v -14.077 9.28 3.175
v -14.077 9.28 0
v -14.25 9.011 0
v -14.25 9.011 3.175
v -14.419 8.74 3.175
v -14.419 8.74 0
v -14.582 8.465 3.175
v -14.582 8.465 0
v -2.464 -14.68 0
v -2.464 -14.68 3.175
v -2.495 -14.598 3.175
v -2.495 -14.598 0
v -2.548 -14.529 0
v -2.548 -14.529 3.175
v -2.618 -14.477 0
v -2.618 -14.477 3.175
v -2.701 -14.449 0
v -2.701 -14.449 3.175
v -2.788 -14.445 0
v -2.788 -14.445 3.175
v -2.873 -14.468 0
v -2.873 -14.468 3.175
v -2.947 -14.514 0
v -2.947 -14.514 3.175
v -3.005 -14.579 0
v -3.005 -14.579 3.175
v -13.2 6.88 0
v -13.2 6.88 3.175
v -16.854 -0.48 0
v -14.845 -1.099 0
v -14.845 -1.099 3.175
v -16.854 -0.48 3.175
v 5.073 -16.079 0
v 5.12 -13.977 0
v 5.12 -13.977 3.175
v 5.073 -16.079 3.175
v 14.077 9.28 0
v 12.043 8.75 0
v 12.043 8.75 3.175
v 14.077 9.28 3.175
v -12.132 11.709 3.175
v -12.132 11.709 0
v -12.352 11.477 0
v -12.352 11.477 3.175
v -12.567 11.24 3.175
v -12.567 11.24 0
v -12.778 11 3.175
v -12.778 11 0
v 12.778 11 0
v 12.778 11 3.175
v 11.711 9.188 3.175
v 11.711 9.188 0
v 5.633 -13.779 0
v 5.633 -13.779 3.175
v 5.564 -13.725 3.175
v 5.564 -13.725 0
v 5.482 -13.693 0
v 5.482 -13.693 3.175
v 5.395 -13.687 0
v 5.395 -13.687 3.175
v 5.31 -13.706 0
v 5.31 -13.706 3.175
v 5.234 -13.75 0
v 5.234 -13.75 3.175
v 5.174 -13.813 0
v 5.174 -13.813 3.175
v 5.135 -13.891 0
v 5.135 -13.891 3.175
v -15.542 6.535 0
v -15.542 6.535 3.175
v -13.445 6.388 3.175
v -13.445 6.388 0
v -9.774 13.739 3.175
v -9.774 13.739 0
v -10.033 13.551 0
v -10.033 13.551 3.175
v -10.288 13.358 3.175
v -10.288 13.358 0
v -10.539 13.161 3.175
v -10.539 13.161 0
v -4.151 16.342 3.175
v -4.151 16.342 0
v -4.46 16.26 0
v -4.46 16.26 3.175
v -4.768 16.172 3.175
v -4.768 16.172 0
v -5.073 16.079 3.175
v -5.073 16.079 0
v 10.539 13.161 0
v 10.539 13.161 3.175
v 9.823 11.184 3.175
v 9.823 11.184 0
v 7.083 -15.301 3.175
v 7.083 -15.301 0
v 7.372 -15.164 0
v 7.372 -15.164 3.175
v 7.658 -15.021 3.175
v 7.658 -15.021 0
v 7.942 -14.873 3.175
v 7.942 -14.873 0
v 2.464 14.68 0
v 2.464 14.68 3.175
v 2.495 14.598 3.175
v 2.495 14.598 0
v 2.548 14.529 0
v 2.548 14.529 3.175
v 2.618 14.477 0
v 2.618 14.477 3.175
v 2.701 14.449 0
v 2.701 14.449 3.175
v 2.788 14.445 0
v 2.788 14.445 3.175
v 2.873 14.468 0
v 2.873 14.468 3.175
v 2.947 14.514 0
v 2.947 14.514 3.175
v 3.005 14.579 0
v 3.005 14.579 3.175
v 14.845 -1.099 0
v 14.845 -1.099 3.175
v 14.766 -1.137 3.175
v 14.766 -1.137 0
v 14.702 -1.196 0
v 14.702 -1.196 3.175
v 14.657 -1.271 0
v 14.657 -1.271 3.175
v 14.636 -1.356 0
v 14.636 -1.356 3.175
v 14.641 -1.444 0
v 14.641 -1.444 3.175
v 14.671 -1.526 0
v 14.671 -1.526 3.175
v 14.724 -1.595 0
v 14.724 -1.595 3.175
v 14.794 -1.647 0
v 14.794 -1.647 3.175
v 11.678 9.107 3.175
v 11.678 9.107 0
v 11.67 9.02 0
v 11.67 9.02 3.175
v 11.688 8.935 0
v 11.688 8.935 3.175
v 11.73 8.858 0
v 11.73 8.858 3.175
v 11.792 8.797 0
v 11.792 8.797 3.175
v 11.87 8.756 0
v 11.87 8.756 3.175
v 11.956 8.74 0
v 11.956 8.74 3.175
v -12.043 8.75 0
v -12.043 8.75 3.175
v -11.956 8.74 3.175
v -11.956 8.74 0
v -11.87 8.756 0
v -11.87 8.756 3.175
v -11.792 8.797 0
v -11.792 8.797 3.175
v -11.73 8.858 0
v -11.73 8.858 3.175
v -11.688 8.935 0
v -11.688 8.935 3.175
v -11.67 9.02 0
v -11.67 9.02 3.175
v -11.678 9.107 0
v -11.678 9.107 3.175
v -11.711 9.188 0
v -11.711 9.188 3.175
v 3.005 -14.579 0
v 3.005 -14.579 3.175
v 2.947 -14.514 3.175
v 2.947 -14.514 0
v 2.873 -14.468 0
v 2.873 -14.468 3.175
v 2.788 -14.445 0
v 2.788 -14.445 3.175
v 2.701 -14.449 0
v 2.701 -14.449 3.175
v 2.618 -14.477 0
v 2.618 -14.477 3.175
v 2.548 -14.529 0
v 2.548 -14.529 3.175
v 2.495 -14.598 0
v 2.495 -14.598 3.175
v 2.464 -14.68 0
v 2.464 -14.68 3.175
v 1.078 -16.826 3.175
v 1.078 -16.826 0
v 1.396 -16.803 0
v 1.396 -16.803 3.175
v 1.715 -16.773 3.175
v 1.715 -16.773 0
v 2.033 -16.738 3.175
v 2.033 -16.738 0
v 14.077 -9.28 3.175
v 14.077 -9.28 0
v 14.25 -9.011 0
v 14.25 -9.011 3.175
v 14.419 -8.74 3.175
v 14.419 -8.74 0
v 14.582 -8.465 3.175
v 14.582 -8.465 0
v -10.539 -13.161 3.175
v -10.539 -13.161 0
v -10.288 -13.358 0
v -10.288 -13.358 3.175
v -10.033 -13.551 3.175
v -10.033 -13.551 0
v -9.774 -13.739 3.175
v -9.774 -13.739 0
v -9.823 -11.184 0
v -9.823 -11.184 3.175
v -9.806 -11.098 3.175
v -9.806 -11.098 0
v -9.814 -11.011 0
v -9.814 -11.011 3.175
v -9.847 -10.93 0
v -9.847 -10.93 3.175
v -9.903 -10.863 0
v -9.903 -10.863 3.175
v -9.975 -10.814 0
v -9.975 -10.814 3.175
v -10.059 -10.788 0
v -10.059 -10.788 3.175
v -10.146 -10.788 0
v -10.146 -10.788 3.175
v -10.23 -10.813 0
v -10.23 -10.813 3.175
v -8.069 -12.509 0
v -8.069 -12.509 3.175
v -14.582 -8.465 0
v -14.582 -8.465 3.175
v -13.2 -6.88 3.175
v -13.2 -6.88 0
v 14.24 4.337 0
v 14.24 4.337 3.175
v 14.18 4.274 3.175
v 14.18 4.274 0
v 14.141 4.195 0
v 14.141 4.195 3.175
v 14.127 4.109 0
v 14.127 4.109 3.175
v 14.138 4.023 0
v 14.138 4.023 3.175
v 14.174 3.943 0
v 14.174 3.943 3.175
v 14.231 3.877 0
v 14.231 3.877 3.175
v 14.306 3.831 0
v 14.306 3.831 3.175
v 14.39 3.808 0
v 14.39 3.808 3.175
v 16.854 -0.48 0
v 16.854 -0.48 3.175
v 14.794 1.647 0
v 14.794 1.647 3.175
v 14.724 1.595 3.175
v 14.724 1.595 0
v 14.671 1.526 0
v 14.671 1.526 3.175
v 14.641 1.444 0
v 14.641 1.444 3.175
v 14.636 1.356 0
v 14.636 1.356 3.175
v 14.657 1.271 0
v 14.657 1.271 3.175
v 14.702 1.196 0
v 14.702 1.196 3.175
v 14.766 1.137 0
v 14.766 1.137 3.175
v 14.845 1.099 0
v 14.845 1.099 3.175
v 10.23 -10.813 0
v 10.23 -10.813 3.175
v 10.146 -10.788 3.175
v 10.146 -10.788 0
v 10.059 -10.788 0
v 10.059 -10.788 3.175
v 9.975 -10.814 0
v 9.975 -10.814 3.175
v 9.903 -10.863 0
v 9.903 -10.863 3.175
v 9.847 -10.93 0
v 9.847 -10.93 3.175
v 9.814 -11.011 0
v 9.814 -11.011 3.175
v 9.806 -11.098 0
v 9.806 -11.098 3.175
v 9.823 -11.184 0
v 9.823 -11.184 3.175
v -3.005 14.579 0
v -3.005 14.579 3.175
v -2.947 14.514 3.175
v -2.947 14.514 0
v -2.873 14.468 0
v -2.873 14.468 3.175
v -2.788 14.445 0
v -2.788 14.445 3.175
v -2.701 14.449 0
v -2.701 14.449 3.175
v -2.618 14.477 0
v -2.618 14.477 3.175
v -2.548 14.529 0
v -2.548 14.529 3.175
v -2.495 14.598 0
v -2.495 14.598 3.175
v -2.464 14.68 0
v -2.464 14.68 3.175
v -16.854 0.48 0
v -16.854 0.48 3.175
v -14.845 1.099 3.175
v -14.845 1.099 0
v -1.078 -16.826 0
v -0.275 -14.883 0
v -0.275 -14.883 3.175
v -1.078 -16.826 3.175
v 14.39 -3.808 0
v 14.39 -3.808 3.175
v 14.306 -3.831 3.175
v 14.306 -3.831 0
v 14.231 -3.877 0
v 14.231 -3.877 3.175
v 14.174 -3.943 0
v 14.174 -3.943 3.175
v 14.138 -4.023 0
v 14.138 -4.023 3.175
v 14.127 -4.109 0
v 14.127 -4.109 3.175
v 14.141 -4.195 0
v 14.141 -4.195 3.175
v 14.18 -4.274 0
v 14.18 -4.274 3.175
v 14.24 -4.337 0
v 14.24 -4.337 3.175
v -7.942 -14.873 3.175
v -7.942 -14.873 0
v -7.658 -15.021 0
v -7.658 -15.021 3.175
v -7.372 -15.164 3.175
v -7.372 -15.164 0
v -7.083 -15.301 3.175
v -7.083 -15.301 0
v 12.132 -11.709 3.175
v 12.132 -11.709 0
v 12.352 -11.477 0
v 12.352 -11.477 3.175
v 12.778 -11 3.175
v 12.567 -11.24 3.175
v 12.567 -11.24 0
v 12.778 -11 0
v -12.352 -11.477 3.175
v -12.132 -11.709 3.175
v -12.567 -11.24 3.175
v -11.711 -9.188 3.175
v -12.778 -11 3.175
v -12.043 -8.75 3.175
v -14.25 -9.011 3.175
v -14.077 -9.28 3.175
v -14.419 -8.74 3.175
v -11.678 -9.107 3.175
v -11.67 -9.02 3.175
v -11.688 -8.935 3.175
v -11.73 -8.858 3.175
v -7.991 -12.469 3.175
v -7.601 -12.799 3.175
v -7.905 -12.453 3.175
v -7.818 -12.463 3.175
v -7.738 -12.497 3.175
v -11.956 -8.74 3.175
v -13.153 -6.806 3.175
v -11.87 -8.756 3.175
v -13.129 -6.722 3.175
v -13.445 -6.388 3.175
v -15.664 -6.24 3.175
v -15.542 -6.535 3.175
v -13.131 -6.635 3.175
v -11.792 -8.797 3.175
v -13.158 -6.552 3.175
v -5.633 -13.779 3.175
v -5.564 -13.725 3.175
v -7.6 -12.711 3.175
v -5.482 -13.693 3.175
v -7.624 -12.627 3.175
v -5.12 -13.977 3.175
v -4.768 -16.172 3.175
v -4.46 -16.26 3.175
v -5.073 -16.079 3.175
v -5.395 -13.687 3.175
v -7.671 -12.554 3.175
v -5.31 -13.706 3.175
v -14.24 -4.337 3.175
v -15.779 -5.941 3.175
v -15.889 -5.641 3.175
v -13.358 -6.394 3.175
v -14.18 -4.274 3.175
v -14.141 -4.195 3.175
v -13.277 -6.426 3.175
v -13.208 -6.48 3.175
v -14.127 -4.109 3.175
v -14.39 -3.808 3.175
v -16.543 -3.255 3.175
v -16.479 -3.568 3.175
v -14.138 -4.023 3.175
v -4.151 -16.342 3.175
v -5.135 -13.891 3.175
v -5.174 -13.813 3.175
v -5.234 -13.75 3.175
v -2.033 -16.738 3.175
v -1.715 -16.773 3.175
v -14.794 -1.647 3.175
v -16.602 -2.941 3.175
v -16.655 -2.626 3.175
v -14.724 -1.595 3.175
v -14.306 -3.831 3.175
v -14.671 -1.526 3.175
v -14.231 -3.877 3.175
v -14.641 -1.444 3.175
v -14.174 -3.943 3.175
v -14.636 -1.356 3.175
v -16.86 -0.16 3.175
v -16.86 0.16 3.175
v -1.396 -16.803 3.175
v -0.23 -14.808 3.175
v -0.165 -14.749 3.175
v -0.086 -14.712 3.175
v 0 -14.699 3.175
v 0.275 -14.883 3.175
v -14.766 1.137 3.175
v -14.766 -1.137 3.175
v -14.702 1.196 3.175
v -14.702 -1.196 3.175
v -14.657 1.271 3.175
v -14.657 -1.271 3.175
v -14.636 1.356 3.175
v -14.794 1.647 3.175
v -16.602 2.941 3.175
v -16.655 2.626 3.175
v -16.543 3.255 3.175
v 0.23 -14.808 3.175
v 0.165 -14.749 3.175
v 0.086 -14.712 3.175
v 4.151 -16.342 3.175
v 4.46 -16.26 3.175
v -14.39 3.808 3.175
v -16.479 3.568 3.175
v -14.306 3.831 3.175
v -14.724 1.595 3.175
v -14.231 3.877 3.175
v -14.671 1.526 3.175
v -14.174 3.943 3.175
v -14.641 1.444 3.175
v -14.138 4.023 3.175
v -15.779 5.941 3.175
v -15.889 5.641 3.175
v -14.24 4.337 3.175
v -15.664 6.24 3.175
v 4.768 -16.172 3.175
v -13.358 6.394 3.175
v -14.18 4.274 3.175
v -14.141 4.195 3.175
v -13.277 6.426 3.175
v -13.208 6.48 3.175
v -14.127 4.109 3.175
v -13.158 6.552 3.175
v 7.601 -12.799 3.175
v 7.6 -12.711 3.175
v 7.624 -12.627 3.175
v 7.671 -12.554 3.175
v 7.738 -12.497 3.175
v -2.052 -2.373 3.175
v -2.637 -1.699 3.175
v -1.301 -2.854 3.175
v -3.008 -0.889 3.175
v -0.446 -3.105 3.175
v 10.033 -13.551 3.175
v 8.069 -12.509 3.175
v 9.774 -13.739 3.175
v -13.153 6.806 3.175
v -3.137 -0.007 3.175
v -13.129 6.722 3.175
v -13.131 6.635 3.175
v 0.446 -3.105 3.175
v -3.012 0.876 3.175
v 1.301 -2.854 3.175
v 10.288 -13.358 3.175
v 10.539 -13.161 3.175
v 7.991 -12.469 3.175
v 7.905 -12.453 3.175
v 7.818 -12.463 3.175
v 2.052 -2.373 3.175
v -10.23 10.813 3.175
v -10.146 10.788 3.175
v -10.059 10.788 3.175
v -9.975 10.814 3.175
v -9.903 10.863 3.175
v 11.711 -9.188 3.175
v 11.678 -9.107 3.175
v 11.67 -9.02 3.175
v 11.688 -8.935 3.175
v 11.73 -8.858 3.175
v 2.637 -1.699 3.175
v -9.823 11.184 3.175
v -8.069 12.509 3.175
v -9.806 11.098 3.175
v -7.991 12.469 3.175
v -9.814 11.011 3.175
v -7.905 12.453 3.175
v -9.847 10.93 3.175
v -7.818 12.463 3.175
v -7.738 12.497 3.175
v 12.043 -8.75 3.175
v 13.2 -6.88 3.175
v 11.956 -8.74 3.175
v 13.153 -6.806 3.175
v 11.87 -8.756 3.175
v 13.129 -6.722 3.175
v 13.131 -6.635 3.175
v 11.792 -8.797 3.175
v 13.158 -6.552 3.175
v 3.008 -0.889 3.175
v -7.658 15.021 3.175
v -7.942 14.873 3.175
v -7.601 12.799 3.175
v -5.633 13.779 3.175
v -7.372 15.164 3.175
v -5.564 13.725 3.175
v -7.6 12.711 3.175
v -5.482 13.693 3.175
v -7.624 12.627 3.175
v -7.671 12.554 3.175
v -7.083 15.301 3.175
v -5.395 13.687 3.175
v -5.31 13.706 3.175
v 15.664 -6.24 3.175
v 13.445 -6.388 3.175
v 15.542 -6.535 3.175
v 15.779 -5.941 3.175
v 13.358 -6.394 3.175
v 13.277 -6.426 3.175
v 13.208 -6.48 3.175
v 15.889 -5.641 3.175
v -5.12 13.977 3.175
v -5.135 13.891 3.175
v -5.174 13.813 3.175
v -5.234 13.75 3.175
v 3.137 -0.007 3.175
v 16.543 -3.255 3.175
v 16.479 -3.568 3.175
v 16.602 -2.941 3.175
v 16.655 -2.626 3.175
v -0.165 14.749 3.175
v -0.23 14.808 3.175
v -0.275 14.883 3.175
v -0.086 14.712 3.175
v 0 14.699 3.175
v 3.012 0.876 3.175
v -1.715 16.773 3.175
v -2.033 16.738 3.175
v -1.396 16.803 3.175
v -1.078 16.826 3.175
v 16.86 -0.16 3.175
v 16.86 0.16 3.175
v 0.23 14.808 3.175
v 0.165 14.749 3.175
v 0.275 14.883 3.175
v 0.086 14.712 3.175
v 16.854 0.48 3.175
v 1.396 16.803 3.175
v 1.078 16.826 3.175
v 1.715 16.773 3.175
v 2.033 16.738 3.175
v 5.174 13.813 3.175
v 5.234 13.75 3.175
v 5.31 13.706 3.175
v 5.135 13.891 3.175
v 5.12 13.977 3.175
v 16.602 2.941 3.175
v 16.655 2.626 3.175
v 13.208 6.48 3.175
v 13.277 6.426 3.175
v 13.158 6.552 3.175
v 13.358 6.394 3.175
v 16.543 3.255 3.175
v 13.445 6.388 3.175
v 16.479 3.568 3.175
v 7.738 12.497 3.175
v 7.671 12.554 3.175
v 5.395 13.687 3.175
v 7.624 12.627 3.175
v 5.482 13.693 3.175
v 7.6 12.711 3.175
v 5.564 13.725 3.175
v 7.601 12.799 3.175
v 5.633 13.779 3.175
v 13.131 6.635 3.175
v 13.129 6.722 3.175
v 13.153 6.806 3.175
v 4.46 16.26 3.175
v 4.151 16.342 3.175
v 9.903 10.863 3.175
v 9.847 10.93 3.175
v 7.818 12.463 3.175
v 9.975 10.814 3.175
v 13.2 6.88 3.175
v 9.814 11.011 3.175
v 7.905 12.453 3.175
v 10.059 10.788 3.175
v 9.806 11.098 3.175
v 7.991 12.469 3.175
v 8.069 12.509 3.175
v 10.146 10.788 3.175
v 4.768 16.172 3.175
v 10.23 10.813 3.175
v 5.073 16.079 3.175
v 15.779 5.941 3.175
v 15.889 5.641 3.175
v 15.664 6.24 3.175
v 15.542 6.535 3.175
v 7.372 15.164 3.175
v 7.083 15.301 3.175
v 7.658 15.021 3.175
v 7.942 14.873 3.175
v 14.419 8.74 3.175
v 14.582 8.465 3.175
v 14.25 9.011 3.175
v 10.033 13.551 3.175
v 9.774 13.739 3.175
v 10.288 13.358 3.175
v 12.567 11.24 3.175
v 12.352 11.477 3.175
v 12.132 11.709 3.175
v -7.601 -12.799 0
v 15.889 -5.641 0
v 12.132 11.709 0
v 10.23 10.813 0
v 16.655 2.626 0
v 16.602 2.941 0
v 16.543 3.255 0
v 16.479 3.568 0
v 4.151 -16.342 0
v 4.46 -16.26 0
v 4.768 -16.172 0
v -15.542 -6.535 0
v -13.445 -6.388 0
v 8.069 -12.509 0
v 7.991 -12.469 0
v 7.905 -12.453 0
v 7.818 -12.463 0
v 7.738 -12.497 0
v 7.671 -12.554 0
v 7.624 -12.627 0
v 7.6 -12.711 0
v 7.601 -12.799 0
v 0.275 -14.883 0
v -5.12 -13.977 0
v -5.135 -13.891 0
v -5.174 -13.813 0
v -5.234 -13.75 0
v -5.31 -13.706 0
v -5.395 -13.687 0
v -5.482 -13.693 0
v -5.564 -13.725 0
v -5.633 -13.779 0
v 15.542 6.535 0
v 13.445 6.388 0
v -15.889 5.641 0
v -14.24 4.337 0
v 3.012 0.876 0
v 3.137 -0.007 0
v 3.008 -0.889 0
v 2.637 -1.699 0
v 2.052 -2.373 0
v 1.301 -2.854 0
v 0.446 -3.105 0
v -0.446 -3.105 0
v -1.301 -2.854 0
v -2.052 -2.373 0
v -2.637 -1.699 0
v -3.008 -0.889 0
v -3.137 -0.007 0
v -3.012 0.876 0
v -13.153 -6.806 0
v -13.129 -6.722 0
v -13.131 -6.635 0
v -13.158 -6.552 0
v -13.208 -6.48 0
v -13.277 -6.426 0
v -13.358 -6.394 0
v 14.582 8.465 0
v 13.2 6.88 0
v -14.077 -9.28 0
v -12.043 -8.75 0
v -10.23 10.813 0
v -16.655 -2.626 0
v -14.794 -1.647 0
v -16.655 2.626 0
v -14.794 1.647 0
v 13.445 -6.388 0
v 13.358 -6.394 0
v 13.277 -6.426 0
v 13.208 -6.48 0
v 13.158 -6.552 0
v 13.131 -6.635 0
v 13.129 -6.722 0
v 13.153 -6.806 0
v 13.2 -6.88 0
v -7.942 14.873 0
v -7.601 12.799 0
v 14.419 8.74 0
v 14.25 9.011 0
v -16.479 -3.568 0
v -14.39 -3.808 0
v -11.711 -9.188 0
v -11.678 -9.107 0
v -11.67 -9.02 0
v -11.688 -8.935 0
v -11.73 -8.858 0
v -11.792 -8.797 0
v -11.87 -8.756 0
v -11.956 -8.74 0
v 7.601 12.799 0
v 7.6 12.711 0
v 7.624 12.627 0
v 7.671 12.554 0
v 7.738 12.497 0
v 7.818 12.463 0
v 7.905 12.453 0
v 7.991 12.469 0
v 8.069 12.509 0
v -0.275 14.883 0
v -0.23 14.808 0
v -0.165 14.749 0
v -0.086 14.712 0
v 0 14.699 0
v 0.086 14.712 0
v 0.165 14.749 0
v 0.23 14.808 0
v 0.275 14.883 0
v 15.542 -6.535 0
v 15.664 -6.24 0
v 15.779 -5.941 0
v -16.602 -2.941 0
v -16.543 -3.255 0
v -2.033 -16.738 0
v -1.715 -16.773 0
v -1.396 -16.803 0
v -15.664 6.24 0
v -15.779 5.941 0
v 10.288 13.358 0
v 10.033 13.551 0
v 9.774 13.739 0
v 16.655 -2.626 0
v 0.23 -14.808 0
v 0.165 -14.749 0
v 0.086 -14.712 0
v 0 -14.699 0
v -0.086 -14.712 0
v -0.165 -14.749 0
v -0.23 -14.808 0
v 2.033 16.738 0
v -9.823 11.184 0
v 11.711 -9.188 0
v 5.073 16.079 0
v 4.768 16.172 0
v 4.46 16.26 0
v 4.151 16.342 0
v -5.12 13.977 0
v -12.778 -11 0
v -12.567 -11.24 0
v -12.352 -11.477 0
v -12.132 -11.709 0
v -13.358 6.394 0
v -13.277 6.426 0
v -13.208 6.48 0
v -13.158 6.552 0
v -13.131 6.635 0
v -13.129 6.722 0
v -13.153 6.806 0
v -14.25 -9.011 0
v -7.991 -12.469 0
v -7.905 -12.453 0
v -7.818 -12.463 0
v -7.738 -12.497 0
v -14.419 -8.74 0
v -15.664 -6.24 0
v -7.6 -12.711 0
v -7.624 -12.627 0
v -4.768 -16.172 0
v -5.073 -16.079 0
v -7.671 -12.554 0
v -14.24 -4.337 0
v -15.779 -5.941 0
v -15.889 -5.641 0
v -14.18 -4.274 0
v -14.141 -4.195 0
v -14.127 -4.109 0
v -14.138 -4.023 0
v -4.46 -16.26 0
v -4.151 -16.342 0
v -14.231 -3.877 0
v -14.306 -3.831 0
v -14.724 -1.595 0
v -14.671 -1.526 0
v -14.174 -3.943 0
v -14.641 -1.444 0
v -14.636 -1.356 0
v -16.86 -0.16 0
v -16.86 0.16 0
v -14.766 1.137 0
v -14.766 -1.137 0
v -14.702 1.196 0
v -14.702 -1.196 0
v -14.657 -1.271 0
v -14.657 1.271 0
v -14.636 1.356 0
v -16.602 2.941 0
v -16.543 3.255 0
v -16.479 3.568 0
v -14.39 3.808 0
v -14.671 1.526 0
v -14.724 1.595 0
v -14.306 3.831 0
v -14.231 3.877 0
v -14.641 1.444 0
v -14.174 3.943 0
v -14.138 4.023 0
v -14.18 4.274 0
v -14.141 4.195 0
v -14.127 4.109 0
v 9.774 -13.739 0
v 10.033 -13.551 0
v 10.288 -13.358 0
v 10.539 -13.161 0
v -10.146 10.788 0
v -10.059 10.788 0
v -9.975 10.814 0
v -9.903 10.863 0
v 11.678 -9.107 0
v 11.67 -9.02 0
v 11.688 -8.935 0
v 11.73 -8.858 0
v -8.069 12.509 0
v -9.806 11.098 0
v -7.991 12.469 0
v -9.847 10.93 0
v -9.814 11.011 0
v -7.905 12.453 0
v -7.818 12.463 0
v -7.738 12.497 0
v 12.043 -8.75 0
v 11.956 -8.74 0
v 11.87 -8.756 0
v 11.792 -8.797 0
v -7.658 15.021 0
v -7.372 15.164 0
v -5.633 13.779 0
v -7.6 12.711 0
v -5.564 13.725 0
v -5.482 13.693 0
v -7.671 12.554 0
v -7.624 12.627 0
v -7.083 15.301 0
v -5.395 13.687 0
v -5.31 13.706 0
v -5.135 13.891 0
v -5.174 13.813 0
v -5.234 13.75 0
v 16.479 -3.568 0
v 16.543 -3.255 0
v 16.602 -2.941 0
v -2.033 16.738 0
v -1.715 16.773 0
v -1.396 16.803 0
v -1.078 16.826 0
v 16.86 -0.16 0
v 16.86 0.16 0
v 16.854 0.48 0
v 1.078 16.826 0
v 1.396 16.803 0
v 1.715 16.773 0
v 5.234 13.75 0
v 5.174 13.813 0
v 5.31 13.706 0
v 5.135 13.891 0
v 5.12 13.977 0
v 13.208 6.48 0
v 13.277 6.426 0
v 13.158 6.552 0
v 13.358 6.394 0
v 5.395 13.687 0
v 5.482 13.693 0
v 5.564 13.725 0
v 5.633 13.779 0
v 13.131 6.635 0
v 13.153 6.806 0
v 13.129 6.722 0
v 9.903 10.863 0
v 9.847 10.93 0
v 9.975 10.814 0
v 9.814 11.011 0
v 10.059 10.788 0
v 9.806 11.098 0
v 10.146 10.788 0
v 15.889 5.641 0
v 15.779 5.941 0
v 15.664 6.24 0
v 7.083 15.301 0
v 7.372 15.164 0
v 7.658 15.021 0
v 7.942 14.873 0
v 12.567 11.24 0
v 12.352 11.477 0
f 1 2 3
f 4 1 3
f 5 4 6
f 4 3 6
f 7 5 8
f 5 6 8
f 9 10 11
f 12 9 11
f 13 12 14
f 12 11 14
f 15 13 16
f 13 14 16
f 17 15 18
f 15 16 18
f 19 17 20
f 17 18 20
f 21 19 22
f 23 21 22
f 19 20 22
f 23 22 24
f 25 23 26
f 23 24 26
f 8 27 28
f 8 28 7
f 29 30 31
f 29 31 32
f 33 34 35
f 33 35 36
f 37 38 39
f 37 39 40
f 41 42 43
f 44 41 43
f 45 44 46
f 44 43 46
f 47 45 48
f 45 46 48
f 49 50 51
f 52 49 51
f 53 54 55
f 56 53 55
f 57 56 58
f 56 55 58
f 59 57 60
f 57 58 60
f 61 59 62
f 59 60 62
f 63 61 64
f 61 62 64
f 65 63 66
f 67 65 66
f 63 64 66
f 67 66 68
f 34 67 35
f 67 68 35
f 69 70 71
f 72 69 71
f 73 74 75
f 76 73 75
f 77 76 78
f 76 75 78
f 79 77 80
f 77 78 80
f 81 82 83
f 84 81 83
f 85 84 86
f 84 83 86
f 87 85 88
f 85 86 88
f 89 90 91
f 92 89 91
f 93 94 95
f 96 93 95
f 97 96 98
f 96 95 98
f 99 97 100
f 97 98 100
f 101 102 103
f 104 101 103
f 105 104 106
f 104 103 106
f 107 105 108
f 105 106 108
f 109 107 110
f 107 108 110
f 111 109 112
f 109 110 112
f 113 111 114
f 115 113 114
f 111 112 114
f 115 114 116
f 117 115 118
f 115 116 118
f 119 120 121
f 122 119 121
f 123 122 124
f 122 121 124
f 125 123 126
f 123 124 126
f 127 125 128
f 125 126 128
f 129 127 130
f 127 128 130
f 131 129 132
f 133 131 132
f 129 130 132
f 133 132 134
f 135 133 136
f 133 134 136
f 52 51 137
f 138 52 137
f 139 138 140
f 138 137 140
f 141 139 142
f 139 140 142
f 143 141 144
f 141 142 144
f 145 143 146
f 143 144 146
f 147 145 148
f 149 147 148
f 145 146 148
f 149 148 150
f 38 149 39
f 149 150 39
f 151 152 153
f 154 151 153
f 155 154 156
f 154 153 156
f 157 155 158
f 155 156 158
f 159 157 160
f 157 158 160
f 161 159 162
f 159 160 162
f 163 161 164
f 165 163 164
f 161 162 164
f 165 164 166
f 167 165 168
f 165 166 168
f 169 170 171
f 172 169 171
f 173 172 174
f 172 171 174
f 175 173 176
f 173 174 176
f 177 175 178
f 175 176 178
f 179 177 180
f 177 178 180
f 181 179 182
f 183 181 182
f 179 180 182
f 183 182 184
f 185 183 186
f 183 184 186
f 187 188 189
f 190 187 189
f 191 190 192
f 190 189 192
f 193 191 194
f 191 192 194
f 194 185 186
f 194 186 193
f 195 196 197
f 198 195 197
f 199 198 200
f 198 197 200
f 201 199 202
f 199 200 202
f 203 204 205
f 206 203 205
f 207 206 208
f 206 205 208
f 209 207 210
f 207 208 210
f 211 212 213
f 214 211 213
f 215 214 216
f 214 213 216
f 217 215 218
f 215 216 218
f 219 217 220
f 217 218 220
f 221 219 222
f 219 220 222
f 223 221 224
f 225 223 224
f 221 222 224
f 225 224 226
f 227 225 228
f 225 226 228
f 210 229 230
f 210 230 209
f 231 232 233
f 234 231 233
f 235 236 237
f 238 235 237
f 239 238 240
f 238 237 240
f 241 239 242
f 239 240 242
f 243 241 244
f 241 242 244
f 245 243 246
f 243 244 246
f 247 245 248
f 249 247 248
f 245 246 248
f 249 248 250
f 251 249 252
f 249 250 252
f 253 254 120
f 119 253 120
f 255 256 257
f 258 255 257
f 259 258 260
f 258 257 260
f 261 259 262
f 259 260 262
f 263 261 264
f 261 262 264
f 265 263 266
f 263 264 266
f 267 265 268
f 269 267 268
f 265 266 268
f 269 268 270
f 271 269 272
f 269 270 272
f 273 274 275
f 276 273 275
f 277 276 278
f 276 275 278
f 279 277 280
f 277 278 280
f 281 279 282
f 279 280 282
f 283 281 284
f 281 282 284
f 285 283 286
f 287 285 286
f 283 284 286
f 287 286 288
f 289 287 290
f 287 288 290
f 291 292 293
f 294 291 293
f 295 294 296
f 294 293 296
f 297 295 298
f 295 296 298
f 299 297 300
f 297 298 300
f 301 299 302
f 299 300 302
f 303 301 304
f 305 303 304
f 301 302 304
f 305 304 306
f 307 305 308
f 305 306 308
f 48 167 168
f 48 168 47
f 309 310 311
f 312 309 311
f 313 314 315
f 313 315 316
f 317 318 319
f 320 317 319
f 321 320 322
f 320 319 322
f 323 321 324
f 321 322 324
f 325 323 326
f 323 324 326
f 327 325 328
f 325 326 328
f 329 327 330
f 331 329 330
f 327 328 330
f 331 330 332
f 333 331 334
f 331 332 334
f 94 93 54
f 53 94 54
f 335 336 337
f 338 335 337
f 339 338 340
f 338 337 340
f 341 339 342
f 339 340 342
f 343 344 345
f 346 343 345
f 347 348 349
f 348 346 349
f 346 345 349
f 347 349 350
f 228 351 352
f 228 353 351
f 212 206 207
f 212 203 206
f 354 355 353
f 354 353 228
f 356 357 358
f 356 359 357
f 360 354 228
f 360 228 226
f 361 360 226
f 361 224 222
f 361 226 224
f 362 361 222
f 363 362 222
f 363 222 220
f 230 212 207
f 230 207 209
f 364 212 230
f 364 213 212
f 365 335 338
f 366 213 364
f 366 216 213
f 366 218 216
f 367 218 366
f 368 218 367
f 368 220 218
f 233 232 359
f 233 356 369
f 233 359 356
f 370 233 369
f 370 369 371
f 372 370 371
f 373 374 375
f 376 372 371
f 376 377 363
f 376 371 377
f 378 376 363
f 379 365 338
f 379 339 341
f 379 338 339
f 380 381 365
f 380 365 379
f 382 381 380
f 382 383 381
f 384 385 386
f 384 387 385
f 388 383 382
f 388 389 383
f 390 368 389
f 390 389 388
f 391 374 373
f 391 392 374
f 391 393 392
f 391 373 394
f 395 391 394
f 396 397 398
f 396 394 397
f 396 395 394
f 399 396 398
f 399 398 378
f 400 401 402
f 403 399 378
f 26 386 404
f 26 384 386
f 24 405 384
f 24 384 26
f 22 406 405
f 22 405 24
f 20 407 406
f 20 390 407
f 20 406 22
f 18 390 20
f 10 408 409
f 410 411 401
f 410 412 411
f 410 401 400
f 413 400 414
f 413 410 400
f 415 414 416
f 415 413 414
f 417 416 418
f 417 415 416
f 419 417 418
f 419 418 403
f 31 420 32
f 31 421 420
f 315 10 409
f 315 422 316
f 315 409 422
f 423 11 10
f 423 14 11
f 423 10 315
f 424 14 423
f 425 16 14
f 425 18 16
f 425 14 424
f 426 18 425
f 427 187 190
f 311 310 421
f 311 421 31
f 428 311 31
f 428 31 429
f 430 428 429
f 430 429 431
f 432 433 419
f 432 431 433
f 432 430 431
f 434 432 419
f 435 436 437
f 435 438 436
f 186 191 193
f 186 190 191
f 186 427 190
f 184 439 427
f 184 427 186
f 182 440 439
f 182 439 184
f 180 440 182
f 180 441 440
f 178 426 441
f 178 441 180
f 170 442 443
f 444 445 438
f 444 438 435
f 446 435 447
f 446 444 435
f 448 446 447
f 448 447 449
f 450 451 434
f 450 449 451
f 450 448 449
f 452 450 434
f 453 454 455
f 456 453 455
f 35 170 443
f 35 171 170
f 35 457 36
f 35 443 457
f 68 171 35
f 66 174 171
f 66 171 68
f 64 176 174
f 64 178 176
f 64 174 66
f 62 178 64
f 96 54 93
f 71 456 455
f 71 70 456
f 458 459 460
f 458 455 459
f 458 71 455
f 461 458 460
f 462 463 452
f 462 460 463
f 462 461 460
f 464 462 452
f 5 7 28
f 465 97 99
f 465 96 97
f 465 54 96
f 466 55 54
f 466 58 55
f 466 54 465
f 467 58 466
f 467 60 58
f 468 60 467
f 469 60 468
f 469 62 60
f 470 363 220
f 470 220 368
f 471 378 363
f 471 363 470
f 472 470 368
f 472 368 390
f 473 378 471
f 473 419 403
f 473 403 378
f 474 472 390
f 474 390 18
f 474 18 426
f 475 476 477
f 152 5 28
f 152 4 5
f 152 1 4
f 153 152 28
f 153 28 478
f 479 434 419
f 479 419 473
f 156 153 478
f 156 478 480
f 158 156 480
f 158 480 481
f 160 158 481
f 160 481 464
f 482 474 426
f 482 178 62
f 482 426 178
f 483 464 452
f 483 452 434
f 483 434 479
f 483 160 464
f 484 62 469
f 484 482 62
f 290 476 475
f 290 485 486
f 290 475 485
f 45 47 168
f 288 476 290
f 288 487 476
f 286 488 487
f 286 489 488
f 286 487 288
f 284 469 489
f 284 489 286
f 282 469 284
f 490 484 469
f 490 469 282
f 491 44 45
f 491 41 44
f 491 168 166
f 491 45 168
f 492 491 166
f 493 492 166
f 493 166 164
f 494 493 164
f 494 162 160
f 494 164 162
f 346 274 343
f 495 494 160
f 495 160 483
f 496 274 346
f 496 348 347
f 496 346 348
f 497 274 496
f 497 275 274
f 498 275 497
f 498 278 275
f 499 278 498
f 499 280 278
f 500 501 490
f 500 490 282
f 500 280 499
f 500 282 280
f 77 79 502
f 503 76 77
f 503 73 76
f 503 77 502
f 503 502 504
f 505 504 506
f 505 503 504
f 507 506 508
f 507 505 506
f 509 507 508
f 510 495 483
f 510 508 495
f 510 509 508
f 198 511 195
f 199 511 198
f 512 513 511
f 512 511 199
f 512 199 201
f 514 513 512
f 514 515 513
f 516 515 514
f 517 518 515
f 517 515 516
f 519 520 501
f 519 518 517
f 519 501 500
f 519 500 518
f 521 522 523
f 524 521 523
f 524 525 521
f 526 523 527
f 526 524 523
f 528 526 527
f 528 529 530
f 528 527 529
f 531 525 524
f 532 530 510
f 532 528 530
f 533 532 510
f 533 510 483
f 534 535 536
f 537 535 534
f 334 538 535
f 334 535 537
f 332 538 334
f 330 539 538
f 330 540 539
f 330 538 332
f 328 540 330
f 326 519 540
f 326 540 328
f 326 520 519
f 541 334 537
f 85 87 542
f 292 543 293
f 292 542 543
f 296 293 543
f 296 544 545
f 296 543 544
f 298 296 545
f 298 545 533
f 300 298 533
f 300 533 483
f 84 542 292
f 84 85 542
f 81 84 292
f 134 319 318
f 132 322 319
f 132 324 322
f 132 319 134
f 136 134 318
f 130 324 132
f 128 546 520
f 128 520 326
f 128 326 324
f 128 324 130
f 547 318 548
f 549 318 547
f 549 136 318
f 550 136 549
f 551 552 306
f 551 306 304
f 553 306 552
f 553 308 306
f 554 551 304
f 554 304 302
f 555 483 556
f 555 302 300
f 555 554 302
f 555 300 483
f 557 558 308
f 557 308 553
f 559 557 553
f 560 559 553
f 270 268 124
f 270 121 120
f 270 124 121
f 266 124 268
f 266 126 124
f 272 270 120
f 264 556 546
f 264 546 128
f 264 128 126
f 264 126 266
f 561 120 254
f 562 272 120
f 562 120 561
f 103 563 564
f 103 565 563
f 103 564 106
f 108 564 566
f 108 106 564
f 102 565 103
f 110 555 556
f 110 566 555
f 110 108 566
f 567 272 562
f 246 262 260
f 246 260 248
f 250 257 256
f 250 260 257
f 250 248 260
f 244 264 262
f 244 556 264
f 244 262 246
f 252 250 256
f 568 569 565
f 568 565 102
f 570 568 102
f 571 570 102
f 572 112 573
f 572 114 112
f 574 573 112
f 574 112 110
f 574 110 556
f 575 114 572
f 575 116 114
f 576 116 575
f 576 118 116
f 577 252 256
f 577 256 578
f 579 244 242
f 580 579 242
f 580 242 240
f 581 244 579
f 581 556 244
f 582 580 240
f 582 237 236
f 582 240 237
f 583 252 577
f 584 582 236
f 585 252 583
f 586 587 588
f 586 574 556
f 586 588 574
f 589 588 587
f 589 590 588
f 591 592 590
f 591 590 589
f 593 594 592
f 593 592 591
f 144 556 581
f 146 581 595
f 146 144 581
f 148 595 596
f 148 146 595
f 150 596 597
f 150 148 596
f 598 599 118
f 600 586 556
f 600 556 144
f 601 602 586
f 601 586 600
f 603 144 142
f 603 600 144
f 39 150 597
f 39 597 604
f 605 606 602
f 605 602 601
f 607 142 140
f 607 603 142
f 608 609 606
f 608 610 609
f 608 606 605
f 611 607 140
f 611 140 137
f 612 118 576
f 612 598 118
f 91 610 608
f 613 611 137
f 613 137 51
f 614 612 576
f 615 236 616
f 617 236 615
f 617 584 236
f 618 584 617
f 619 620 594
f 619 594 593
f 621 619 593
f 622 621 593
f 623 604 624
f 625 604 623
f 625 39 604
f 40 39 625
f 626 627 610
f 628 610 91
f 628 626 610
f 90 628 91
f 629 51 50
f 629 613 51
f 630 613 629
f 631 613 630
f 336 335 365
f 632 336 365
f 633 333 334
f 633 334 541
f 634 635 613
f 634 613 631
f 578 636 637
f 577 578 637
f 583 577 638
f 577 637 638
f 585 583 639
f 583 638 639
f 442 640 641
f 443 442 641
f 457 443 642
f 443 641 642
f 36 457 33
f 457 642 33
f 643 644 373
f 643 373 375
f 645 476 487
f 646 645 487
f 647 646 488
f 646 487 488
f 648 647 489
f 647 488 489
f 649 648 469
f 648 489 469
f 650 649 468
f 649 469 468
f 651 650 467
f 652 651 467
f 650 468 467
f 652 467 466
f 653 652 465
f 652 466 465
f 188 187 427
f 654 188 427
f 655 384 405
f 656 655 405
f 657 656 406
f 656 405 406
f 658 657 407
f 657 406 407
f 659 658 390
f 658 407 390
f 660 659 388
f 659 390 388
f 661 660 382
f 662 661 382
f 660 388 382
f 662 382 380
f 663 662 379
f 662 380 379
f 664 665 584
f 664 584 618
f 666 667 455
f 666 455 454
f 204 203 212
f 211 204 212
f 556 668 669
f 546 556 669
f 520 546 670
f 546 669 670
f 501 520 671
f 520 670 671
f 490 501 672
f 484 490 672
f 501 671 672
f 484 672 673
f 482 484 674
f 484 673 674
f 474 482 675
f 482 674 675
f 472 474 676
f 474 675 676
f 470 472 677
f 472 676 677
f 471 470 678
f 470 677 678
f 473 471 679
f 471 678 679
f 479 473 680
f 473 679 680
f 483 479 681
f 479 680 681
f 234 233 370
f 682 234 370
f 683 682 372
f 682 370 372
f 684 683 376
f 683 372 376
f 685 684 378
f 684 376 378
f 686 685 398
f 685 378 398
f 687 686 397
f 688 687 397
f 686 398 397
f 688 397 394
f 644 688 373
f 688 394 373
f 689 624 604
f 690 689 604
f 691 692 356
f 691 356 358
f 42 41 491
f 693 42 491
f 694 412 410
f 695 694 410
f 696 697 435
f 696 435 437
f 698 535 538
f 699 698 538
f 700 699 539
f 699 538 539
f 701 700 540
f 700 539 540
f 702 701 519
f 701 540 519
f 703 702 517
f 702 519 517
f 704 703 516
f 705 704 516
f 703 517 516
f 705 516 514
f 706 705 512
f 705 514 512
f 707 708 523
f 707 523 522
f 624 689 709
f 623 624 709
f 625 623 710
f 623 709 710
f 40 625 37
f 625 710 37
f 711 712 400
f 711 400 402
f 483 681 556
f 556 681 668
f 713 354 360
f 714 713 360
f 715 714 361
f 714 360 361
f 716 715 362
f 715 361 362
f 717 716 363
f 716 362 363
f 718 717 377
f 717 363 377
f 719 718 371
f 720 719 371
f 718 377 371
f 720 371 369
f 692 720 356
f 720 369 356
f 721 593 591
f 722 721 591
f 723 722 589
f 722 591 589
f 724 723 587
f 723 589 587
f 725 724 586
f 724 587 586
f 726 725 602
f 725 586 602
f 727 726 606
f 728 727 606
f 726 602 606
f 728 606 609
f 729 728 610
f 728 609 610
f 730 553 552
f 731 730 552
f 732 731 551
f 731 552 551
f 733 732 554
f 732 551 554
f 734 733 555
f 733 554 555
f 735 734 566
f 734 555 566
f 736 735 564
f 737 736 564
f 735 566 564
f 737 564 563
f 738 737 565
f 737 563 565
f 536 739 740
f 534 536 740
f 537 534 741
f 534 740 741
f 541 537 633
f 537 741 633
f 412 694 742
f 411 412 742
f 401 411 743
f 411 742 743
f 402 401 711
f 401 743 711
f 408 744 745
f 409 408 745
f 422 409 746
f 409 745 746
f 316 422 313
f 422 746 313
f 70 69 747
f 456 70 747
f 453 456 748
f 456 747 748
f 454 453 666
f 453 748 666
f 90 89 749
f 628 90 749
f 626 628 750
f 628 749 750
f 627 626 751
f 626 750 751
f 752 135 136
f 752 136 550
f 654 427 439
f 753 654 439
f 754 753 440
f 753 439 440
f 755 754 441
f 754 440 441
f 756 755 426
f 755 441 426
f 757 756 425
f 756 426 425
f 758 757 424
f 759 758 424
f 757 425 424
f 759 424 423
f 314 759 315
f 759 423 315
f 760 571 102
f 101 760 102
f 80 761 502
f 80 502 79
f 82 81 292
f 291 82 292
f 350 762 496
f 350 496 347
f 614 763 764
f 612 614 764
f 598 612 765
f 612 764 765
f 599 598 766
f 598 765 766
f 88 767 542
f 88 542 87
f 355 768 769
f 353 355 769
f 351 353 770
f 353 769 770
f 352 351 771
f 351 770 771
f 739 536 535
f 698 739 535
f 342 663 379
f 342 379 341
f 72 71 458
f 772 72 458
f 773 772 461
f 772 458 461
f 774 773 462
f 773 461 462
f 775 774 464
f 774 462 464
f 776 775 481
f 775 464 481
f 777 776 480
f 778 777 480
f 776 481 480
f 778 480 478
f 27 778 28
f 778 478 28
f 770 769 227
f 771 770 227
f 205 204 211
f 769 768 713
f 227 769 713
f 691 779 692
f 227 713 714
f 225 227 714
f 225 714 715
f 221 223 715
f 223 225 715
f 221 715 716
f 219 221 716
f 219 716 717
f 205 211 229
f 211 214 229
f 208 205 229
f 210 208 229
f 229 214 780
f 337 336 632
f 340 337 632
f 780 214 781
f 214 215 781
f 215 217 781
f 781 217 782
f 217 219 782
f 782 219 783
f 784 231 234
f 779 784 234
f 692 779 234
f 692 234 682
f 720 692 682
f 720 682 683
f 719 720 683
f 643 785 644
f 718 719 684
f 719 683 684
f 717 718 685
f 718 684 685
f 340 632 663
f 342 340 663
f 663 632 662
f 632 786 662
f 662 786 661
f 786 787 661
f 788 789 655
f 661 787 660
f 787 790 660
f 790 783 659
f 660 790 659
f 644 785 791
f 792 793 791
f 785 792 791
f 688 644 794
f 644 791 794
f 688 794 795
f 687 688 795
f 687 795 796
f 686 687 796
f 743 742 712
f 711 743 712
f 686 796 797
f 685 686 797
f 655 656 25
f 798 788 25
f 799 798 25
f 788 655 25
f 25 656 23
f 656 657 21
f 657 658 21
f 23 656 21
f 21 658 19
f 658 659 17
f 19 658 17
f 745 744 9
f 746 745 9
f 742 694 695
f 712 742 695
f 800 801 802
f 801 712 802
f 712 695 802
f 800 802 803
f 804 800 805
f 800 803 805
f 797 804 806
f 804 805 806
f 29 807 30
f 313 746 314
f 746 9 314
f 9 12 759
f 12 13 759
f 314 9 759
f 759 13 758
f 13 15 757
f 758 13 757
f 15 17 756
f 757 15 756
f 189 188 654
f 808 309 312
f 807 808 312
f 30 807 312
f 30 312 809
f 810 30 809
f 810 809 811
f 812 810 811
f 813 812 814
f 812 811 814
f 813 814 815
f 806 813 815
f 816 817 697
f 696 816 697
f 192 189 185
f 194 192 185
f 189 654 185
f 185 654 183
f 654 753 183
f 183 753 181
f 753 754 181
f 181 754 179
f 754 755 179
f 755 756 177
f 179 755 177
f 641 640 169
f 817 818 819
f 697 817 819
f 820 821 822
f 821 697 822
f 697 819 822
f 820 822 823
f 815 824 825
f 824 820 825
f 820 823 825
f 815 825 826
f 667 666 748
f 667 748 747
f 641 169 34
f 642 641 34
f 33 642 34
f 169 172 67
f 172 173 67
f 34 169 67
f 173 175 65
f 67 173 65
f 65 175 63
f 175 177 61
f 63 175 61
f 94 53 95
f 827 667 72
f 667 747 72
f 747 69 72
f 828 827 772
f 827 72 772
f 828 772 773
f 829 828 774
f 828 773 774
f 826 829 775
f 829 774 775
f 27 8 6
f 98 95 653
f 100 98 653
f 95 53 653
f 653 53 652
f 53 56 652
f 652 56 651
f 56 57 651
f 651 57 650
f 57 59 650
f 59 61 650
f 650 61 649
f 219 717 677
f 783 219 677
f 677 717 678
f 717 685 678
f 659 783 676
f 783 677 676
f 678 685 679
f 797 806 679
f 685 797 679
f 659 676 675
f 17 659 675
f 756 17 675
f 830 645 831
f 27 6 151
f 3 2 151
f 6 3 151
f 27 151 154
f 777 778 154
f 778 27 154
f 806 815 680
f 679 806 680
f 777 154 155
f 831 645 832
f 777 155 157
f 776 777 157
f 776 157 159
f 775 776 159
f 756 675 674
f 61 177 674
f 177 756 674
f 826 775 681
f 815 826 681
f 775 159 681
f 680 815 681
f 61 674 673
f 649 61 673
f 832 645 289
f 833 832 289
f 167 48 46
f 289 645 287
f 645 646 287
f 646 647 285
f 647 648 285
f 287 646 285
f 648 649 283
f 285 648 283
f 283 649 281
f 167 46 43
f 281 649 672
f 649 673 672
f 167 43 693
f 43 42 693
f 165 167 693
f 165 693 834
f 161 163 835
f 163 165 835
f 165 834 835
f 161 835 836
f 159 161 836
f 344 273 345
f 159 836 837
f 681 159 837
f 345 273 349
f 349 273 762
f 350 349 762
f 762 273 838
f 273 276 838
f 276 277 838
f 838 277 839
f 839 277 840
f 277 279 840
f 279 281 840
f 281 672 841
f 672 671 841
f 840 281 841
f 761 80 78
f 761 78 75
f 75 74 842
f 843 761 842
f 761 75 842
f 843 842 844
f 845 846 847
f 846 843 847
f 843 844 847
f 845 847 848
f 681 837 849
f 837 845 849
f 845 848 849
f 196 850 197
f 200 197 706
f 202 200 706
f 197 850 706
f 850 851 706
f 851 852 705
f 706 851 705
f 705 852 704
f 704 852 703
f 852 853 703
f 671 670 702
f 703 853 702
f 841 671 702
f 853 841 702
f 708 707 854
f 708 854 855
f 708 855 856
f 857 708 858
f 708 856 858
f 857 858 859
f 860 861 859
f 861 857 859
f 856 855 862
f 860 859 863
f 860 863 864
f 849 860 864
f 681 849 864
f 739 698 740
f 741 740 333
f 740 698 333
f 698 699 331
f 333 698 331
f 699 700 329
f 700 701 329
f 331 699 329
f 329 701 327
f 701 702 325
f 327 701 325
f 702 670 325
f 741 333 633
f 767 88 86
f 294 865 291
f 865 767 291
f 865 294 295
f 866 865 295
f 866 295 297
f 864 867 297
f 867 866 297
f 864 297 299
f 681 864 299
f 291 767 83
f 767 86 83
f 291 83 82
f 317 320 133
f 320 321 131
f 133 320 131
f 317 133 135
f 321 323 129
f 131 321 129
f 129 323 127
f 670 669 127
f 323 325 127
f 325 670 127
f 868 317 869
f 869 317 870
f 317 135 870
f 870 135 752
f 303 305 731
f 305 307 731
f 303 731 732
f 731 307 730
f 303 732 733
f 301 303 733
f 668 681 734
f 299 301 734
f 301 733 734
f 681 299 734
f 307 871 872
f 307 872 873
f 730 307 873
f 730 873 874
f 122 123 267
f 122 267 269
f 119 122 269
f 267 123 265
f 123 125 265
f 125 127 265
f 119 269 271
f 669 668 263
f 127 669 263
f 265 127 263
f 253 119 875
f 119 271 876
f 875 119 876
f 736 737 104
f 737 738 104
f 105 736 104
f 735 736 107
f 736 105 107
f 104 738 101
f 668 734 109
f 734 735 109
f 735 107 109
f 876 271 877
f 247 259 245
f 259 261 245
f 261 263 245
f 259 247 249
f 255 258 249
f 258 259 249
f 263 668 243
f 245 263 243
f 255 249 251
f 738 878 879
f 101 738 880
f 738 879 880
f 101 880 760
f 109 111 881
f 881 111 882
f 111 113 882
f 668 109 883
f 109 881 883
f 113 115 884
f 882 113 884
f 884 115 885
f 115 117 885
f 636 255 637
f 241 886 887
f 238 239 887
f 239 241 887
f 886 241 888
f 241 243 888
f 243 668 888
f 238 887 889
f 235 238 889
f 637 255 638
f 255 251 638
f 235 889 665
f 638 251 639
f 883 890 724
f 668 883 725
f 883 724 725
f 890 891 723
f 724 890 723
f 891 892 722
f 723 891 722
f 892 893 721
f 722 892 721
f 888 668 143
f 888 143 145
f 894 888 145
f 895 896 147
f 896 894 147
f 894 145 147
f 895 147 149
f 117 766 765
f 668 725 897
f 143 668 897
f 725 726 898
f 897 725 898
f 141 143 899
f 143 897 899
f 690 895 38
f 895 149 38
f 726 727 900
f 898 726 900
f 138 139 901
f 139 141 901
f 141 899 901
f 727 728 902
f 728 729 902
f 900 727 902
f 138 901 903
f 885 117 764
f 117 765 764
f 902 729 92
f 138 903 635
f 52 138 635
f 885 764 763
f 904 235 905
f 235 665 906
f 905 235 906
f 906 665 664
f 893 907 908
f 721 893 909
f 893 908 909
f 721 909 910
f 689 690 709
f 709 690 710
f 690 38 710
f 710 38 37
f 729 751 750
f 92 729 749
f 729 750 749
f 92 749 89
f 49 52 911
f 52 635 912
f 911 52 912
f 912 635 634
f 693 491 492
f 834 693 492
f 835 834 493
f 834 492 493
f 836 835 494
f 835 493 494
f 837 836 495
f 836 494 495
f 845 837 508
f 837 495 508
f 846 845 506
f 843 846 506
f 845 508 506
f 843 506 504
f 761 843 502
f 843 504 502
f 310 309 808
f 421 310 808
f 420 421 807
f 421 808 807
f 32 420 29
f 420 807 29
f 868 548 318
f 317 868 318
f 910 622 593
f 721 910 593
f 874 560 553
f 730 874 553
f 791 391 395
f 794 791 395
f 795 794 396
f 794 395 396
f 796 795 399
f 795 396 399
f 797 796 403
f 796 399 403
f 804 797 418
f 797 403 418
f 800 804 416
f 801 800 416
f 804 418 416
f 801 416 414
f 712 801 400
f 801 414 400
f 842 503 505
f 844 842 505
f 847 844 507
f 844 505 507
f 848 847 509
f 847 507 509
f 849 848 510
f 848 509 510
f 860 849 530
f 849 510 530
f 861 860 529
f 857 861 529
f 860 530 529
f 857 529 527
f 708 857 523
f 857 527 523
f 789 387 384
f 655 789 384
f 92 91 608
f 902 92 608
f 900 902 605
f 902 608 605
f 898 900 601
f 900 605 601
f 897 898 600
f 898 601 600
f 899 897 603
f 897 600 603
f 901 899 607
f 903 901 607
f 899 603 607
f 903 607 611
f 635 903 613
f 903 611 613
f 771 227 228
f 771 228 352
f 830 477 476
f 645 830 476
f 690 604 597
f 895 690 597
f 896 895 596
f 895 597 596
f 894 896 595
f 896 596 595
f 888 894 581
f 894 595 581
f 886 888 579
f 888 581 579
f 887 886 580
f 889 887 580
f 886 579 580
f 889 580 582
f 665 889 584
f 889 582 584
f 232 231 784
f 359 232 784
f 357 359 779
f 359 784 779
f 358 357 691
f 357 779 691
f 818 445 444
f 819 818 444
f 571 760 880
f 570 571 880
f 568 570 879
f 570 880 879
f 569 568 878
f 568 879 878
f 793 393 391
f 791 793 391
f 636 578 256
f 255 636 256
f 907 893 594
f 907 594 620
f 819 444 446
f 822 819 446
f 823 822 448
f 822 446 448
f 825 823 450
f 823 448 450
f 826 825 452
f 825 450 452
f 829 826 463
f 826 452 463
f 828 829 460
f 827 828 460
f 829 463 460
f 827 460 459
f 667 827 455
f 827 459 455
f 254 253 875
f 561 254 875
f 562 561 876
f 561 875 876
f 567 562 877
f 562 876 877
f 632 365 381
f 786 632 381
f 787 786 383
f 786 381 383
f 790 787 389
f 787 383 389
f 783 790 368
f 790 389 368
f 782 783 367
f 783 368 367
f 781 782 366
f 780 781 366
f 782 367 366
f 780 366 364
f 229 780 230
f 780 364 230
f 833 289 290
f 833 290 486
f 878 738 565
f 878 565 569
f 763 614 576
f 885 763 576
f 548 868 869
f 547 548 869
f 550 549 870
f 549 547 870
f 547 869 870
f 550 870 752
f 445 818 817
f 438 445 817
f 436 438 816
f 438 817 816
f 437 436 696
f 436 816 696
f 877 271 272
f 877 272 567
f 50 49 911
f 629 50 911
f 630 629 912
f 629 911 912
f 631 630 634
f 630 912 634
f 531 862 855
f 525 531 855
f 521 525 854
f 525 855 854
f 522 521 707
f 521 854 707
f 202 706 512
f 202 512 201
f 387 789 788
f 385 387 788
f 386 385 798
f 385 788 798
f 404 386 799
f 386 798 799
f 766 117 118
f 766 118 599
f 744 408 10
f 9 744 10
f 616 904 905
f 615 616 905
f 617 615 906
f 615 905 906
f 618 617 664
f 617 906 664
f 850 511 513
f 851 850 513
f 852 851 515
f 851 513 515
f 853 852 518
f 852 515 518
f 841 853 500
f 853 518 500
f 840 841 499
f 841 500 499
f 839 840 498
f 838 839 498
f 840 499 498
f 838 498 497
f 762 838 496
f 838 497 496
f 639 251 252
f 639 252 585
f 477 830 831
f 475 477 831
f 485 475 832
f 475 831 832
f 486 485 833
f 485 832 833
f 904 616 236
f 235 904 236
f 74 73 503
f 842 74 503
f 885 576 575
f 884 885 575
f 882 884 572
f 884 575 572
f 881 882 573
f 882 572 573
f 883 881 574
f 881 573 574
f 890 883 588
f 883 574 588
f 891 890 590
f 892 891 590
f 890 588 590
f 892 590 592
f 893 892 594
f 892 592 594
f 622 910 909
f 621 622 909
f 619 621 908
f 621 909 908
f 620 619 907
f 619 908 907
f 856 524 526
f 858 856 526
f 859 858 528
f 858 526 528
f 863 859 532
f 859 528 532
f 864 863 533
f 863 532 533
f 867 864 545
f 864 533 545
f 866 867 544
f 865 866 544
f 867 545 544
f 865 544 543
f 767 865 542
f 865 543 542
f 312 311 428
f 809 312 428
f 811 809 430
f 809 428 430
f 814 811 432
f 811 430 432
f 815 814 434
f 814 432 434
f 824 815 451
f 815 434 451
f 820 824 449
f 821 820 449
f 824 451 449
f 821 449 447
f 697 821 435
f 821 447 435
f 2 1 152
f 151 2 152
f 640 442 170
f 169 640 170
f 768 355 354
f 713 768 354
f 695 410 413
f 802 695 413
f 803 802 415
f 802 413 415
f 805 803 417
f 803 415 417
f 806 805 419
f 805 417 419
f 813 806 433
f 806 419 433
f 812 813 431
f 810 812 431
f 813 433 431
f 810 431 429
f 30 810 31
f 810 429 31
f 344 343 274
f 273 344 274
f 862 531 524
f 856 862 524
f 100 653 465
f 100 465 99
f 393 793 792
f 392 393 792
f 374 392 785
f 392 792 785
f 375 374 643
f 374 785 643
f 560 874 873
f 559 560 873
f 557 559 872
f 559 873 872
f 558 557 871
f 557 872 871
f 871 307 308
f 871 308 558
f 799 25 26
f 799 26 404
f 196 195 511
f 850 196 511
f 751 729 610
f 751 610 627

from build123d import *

# Parameters (mm, degrees)
F0_R            = 16.8606013276
F1_DEPTH        = 3.175
F3_DEPTH        = 3.175
F3_COPIES_COUNT = 34


# Not quite as in the source:
# - a pattern or mirror of a feature is missing from the dataset's text; its kind, count and spacing are read off the source's solid
# - a feature names something its author has since deleted; it is built from what else it names


with BuildPart() as f1:
    # F0 (on Top) → F1 (new body)
    with BuildSketch(Plane.XY):
        Circle(F0_R)
        with BuildLine():
            ThreePointArc((3.0120209, 0.8762828927), (0, -3.1369), (-3.0120209, 0.8762828927))
            Line((-3.0120209, 0.8762828927), (3.0120209, 0.8762828927))
        make_face(mode=Mode.SUBTRACT)
    extrude(amount=F1_DEPTH)

    # F2 (on face) → F3 (cut, through all)
    with BuildSketch(Plane.XY.offset(3.175)):
        with BuildLine():
            Line((0.2750051008, 14.882965874), (1.0776094804, 16.8261295293))
            ThreePointArc((1.0776094804, 16.8261295293), (0, 16.8606013276), (-1.0776094804, 16.8261295293))
            Line((-1.0776094804, 16.8261295293), (-0.2750051008, 14.882965874))
            ThreePointArc((-0.2750051008, 14.882965874), (0, 14.6990139664), (0.2750051008, 14.882965874))
        make_face()
    f3 = extrude(amount=-F3_DEPTH, mode=Mode.SUBTRACT)

    # F3_copies: F3 ×34 about axis
    f3_copies_axis = Axis((0, 0, 0), (0, 0, 1))
    for i in range(1, F3_COPIES_COUNT):
        add(f3.rotate(f3_copies_axis, i * 360 / F3_COPIES_COUNT), mode=Mode.SUBTRACT)


solid = f1.part
